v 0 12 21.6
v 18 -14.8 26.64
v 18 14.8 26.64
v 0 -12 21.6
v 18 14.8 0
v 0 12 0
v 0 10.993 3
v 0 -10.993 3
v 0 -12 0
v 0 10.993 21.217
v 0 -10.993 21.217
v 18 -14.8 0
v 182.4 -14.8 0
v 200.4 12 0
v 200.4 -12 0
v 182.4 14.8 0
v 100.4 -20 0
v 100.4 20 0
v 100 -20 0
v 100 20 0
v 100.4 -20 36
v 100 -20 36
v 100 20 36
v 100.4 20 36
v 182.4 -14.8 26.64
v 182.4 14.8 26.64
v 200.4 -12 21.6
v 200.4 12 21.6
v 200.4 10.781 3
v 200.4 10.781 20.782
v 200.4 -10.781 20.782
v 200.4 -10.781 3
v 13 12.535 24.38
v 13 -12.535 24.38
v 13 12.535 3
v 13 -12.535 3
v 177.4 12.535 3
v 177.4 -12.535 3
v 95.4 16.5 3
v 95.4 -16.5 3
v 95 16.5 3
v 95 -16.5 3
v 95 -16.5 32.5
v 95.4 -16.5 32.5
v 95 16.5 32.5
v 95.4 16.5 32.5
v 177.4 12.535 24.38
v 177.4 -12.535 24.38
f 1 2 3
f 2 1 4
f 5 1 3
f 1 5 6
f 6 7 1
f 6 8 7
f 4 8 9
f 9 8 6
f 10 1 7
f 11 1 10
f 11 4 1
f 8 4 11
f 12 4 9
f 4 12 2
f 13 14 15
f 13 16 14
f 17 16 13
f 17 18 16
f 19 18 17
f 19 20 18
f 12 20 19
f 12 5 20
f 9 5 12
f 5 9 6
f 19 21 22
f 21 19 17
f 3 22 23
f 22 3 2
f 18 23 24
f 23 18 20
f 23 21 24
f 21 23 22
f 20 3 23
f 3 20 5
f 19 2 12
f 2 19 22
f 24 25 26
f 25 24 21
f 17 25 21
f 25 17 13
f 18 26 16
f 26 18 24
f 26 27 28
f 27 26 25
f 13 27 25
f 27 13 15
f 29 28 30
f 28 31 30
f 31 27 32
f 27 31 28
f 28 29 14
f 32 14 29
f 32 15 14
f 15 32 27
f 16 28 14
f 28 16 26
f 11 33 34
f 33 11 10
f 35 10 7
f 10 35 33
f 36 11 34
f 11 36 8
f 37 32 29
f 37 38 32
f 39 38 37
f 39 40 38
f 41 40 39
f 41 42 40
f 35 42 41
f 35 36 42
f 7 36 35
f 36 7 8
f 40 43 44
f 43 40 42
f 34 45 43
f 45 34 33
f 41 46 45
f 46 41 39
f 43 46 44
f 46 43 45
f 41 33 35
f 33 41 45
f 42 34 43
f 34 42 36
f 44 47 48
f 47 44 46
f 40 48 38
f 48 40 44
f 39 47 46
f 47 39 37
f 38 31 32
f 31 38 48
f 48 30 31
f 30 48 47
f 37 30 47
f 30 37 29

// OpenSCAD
$fn = 32;

// ----------------------------------------------------------------------
// Faired channel: 200 x 40 x 36 mm, 3.5 mm walls, faired ends
// ----------------------------------------------------------------------

// --- parameters (mm) ---
length = 200;             // channel length
width = 40;               // channel width at mid length
height = 36;              // channel height at mid length
wall = 3.5;               // side wall thickness
floor_t = 3;              // floor thickness
end_w = 24;               // faired end width
end_h = 21.6;             // faired end height

difference() {
  union() {
    hull() {
      translate([0, -12, 0]) cube([0.4, 24, 21.6]);
      translate([18, -14.8, 0]) cube([0.4, 29.6, 26.64]);
    }
    hull() {
      translate([18, -14.8, 0]) cube([0.4, 29.6, 26.64]);
      translate([100, -20, 0]) cube([0.4, 40, 36]);
    }
    hull() {
      translate([100, -20, 0]) cube([0.4, 40, 36]);
      translate([182, -14.8, 0]) cube([0.4, 29.6, 26.64]);
    }
    hull() {
      translate([182, -14.8, 0]) cube([0.4, 29.6, 26.64]);
      translate([200, -12, 0]) cube([0.4, 24, 21.6]);
    }
  }
  /* cavity, 5 mm proud of both ends so the ports are cut clean */
  hull() {
    translate([-5, -10.4, 3]) cube([0.4, 20.8, 17]);
    translate([13, -12.535, 3]) cube([0.4, 25.07, 21.38]);
  }
  hull() {
    translate([13, -12.535, 3]) cube([0.4, 25.07, 21.38]);
    translate([95, -16.5, 3]) cube([0.4, 33, 29.5]);
  }
  hull() {
    translate([95, -16.5, 3]) cube([0.4, 33, 29.5]);
    translate([177, -12.535, 3]) cube([0.4, 25.07, 21.38]);
  }
  hull() {
    translate([177, -12.535, 3]) cube([0.4, 25.07, 21.38]);
    translate([205, -10.4, 3]) cube([0.4, 20.8, 17]);
  }
}
